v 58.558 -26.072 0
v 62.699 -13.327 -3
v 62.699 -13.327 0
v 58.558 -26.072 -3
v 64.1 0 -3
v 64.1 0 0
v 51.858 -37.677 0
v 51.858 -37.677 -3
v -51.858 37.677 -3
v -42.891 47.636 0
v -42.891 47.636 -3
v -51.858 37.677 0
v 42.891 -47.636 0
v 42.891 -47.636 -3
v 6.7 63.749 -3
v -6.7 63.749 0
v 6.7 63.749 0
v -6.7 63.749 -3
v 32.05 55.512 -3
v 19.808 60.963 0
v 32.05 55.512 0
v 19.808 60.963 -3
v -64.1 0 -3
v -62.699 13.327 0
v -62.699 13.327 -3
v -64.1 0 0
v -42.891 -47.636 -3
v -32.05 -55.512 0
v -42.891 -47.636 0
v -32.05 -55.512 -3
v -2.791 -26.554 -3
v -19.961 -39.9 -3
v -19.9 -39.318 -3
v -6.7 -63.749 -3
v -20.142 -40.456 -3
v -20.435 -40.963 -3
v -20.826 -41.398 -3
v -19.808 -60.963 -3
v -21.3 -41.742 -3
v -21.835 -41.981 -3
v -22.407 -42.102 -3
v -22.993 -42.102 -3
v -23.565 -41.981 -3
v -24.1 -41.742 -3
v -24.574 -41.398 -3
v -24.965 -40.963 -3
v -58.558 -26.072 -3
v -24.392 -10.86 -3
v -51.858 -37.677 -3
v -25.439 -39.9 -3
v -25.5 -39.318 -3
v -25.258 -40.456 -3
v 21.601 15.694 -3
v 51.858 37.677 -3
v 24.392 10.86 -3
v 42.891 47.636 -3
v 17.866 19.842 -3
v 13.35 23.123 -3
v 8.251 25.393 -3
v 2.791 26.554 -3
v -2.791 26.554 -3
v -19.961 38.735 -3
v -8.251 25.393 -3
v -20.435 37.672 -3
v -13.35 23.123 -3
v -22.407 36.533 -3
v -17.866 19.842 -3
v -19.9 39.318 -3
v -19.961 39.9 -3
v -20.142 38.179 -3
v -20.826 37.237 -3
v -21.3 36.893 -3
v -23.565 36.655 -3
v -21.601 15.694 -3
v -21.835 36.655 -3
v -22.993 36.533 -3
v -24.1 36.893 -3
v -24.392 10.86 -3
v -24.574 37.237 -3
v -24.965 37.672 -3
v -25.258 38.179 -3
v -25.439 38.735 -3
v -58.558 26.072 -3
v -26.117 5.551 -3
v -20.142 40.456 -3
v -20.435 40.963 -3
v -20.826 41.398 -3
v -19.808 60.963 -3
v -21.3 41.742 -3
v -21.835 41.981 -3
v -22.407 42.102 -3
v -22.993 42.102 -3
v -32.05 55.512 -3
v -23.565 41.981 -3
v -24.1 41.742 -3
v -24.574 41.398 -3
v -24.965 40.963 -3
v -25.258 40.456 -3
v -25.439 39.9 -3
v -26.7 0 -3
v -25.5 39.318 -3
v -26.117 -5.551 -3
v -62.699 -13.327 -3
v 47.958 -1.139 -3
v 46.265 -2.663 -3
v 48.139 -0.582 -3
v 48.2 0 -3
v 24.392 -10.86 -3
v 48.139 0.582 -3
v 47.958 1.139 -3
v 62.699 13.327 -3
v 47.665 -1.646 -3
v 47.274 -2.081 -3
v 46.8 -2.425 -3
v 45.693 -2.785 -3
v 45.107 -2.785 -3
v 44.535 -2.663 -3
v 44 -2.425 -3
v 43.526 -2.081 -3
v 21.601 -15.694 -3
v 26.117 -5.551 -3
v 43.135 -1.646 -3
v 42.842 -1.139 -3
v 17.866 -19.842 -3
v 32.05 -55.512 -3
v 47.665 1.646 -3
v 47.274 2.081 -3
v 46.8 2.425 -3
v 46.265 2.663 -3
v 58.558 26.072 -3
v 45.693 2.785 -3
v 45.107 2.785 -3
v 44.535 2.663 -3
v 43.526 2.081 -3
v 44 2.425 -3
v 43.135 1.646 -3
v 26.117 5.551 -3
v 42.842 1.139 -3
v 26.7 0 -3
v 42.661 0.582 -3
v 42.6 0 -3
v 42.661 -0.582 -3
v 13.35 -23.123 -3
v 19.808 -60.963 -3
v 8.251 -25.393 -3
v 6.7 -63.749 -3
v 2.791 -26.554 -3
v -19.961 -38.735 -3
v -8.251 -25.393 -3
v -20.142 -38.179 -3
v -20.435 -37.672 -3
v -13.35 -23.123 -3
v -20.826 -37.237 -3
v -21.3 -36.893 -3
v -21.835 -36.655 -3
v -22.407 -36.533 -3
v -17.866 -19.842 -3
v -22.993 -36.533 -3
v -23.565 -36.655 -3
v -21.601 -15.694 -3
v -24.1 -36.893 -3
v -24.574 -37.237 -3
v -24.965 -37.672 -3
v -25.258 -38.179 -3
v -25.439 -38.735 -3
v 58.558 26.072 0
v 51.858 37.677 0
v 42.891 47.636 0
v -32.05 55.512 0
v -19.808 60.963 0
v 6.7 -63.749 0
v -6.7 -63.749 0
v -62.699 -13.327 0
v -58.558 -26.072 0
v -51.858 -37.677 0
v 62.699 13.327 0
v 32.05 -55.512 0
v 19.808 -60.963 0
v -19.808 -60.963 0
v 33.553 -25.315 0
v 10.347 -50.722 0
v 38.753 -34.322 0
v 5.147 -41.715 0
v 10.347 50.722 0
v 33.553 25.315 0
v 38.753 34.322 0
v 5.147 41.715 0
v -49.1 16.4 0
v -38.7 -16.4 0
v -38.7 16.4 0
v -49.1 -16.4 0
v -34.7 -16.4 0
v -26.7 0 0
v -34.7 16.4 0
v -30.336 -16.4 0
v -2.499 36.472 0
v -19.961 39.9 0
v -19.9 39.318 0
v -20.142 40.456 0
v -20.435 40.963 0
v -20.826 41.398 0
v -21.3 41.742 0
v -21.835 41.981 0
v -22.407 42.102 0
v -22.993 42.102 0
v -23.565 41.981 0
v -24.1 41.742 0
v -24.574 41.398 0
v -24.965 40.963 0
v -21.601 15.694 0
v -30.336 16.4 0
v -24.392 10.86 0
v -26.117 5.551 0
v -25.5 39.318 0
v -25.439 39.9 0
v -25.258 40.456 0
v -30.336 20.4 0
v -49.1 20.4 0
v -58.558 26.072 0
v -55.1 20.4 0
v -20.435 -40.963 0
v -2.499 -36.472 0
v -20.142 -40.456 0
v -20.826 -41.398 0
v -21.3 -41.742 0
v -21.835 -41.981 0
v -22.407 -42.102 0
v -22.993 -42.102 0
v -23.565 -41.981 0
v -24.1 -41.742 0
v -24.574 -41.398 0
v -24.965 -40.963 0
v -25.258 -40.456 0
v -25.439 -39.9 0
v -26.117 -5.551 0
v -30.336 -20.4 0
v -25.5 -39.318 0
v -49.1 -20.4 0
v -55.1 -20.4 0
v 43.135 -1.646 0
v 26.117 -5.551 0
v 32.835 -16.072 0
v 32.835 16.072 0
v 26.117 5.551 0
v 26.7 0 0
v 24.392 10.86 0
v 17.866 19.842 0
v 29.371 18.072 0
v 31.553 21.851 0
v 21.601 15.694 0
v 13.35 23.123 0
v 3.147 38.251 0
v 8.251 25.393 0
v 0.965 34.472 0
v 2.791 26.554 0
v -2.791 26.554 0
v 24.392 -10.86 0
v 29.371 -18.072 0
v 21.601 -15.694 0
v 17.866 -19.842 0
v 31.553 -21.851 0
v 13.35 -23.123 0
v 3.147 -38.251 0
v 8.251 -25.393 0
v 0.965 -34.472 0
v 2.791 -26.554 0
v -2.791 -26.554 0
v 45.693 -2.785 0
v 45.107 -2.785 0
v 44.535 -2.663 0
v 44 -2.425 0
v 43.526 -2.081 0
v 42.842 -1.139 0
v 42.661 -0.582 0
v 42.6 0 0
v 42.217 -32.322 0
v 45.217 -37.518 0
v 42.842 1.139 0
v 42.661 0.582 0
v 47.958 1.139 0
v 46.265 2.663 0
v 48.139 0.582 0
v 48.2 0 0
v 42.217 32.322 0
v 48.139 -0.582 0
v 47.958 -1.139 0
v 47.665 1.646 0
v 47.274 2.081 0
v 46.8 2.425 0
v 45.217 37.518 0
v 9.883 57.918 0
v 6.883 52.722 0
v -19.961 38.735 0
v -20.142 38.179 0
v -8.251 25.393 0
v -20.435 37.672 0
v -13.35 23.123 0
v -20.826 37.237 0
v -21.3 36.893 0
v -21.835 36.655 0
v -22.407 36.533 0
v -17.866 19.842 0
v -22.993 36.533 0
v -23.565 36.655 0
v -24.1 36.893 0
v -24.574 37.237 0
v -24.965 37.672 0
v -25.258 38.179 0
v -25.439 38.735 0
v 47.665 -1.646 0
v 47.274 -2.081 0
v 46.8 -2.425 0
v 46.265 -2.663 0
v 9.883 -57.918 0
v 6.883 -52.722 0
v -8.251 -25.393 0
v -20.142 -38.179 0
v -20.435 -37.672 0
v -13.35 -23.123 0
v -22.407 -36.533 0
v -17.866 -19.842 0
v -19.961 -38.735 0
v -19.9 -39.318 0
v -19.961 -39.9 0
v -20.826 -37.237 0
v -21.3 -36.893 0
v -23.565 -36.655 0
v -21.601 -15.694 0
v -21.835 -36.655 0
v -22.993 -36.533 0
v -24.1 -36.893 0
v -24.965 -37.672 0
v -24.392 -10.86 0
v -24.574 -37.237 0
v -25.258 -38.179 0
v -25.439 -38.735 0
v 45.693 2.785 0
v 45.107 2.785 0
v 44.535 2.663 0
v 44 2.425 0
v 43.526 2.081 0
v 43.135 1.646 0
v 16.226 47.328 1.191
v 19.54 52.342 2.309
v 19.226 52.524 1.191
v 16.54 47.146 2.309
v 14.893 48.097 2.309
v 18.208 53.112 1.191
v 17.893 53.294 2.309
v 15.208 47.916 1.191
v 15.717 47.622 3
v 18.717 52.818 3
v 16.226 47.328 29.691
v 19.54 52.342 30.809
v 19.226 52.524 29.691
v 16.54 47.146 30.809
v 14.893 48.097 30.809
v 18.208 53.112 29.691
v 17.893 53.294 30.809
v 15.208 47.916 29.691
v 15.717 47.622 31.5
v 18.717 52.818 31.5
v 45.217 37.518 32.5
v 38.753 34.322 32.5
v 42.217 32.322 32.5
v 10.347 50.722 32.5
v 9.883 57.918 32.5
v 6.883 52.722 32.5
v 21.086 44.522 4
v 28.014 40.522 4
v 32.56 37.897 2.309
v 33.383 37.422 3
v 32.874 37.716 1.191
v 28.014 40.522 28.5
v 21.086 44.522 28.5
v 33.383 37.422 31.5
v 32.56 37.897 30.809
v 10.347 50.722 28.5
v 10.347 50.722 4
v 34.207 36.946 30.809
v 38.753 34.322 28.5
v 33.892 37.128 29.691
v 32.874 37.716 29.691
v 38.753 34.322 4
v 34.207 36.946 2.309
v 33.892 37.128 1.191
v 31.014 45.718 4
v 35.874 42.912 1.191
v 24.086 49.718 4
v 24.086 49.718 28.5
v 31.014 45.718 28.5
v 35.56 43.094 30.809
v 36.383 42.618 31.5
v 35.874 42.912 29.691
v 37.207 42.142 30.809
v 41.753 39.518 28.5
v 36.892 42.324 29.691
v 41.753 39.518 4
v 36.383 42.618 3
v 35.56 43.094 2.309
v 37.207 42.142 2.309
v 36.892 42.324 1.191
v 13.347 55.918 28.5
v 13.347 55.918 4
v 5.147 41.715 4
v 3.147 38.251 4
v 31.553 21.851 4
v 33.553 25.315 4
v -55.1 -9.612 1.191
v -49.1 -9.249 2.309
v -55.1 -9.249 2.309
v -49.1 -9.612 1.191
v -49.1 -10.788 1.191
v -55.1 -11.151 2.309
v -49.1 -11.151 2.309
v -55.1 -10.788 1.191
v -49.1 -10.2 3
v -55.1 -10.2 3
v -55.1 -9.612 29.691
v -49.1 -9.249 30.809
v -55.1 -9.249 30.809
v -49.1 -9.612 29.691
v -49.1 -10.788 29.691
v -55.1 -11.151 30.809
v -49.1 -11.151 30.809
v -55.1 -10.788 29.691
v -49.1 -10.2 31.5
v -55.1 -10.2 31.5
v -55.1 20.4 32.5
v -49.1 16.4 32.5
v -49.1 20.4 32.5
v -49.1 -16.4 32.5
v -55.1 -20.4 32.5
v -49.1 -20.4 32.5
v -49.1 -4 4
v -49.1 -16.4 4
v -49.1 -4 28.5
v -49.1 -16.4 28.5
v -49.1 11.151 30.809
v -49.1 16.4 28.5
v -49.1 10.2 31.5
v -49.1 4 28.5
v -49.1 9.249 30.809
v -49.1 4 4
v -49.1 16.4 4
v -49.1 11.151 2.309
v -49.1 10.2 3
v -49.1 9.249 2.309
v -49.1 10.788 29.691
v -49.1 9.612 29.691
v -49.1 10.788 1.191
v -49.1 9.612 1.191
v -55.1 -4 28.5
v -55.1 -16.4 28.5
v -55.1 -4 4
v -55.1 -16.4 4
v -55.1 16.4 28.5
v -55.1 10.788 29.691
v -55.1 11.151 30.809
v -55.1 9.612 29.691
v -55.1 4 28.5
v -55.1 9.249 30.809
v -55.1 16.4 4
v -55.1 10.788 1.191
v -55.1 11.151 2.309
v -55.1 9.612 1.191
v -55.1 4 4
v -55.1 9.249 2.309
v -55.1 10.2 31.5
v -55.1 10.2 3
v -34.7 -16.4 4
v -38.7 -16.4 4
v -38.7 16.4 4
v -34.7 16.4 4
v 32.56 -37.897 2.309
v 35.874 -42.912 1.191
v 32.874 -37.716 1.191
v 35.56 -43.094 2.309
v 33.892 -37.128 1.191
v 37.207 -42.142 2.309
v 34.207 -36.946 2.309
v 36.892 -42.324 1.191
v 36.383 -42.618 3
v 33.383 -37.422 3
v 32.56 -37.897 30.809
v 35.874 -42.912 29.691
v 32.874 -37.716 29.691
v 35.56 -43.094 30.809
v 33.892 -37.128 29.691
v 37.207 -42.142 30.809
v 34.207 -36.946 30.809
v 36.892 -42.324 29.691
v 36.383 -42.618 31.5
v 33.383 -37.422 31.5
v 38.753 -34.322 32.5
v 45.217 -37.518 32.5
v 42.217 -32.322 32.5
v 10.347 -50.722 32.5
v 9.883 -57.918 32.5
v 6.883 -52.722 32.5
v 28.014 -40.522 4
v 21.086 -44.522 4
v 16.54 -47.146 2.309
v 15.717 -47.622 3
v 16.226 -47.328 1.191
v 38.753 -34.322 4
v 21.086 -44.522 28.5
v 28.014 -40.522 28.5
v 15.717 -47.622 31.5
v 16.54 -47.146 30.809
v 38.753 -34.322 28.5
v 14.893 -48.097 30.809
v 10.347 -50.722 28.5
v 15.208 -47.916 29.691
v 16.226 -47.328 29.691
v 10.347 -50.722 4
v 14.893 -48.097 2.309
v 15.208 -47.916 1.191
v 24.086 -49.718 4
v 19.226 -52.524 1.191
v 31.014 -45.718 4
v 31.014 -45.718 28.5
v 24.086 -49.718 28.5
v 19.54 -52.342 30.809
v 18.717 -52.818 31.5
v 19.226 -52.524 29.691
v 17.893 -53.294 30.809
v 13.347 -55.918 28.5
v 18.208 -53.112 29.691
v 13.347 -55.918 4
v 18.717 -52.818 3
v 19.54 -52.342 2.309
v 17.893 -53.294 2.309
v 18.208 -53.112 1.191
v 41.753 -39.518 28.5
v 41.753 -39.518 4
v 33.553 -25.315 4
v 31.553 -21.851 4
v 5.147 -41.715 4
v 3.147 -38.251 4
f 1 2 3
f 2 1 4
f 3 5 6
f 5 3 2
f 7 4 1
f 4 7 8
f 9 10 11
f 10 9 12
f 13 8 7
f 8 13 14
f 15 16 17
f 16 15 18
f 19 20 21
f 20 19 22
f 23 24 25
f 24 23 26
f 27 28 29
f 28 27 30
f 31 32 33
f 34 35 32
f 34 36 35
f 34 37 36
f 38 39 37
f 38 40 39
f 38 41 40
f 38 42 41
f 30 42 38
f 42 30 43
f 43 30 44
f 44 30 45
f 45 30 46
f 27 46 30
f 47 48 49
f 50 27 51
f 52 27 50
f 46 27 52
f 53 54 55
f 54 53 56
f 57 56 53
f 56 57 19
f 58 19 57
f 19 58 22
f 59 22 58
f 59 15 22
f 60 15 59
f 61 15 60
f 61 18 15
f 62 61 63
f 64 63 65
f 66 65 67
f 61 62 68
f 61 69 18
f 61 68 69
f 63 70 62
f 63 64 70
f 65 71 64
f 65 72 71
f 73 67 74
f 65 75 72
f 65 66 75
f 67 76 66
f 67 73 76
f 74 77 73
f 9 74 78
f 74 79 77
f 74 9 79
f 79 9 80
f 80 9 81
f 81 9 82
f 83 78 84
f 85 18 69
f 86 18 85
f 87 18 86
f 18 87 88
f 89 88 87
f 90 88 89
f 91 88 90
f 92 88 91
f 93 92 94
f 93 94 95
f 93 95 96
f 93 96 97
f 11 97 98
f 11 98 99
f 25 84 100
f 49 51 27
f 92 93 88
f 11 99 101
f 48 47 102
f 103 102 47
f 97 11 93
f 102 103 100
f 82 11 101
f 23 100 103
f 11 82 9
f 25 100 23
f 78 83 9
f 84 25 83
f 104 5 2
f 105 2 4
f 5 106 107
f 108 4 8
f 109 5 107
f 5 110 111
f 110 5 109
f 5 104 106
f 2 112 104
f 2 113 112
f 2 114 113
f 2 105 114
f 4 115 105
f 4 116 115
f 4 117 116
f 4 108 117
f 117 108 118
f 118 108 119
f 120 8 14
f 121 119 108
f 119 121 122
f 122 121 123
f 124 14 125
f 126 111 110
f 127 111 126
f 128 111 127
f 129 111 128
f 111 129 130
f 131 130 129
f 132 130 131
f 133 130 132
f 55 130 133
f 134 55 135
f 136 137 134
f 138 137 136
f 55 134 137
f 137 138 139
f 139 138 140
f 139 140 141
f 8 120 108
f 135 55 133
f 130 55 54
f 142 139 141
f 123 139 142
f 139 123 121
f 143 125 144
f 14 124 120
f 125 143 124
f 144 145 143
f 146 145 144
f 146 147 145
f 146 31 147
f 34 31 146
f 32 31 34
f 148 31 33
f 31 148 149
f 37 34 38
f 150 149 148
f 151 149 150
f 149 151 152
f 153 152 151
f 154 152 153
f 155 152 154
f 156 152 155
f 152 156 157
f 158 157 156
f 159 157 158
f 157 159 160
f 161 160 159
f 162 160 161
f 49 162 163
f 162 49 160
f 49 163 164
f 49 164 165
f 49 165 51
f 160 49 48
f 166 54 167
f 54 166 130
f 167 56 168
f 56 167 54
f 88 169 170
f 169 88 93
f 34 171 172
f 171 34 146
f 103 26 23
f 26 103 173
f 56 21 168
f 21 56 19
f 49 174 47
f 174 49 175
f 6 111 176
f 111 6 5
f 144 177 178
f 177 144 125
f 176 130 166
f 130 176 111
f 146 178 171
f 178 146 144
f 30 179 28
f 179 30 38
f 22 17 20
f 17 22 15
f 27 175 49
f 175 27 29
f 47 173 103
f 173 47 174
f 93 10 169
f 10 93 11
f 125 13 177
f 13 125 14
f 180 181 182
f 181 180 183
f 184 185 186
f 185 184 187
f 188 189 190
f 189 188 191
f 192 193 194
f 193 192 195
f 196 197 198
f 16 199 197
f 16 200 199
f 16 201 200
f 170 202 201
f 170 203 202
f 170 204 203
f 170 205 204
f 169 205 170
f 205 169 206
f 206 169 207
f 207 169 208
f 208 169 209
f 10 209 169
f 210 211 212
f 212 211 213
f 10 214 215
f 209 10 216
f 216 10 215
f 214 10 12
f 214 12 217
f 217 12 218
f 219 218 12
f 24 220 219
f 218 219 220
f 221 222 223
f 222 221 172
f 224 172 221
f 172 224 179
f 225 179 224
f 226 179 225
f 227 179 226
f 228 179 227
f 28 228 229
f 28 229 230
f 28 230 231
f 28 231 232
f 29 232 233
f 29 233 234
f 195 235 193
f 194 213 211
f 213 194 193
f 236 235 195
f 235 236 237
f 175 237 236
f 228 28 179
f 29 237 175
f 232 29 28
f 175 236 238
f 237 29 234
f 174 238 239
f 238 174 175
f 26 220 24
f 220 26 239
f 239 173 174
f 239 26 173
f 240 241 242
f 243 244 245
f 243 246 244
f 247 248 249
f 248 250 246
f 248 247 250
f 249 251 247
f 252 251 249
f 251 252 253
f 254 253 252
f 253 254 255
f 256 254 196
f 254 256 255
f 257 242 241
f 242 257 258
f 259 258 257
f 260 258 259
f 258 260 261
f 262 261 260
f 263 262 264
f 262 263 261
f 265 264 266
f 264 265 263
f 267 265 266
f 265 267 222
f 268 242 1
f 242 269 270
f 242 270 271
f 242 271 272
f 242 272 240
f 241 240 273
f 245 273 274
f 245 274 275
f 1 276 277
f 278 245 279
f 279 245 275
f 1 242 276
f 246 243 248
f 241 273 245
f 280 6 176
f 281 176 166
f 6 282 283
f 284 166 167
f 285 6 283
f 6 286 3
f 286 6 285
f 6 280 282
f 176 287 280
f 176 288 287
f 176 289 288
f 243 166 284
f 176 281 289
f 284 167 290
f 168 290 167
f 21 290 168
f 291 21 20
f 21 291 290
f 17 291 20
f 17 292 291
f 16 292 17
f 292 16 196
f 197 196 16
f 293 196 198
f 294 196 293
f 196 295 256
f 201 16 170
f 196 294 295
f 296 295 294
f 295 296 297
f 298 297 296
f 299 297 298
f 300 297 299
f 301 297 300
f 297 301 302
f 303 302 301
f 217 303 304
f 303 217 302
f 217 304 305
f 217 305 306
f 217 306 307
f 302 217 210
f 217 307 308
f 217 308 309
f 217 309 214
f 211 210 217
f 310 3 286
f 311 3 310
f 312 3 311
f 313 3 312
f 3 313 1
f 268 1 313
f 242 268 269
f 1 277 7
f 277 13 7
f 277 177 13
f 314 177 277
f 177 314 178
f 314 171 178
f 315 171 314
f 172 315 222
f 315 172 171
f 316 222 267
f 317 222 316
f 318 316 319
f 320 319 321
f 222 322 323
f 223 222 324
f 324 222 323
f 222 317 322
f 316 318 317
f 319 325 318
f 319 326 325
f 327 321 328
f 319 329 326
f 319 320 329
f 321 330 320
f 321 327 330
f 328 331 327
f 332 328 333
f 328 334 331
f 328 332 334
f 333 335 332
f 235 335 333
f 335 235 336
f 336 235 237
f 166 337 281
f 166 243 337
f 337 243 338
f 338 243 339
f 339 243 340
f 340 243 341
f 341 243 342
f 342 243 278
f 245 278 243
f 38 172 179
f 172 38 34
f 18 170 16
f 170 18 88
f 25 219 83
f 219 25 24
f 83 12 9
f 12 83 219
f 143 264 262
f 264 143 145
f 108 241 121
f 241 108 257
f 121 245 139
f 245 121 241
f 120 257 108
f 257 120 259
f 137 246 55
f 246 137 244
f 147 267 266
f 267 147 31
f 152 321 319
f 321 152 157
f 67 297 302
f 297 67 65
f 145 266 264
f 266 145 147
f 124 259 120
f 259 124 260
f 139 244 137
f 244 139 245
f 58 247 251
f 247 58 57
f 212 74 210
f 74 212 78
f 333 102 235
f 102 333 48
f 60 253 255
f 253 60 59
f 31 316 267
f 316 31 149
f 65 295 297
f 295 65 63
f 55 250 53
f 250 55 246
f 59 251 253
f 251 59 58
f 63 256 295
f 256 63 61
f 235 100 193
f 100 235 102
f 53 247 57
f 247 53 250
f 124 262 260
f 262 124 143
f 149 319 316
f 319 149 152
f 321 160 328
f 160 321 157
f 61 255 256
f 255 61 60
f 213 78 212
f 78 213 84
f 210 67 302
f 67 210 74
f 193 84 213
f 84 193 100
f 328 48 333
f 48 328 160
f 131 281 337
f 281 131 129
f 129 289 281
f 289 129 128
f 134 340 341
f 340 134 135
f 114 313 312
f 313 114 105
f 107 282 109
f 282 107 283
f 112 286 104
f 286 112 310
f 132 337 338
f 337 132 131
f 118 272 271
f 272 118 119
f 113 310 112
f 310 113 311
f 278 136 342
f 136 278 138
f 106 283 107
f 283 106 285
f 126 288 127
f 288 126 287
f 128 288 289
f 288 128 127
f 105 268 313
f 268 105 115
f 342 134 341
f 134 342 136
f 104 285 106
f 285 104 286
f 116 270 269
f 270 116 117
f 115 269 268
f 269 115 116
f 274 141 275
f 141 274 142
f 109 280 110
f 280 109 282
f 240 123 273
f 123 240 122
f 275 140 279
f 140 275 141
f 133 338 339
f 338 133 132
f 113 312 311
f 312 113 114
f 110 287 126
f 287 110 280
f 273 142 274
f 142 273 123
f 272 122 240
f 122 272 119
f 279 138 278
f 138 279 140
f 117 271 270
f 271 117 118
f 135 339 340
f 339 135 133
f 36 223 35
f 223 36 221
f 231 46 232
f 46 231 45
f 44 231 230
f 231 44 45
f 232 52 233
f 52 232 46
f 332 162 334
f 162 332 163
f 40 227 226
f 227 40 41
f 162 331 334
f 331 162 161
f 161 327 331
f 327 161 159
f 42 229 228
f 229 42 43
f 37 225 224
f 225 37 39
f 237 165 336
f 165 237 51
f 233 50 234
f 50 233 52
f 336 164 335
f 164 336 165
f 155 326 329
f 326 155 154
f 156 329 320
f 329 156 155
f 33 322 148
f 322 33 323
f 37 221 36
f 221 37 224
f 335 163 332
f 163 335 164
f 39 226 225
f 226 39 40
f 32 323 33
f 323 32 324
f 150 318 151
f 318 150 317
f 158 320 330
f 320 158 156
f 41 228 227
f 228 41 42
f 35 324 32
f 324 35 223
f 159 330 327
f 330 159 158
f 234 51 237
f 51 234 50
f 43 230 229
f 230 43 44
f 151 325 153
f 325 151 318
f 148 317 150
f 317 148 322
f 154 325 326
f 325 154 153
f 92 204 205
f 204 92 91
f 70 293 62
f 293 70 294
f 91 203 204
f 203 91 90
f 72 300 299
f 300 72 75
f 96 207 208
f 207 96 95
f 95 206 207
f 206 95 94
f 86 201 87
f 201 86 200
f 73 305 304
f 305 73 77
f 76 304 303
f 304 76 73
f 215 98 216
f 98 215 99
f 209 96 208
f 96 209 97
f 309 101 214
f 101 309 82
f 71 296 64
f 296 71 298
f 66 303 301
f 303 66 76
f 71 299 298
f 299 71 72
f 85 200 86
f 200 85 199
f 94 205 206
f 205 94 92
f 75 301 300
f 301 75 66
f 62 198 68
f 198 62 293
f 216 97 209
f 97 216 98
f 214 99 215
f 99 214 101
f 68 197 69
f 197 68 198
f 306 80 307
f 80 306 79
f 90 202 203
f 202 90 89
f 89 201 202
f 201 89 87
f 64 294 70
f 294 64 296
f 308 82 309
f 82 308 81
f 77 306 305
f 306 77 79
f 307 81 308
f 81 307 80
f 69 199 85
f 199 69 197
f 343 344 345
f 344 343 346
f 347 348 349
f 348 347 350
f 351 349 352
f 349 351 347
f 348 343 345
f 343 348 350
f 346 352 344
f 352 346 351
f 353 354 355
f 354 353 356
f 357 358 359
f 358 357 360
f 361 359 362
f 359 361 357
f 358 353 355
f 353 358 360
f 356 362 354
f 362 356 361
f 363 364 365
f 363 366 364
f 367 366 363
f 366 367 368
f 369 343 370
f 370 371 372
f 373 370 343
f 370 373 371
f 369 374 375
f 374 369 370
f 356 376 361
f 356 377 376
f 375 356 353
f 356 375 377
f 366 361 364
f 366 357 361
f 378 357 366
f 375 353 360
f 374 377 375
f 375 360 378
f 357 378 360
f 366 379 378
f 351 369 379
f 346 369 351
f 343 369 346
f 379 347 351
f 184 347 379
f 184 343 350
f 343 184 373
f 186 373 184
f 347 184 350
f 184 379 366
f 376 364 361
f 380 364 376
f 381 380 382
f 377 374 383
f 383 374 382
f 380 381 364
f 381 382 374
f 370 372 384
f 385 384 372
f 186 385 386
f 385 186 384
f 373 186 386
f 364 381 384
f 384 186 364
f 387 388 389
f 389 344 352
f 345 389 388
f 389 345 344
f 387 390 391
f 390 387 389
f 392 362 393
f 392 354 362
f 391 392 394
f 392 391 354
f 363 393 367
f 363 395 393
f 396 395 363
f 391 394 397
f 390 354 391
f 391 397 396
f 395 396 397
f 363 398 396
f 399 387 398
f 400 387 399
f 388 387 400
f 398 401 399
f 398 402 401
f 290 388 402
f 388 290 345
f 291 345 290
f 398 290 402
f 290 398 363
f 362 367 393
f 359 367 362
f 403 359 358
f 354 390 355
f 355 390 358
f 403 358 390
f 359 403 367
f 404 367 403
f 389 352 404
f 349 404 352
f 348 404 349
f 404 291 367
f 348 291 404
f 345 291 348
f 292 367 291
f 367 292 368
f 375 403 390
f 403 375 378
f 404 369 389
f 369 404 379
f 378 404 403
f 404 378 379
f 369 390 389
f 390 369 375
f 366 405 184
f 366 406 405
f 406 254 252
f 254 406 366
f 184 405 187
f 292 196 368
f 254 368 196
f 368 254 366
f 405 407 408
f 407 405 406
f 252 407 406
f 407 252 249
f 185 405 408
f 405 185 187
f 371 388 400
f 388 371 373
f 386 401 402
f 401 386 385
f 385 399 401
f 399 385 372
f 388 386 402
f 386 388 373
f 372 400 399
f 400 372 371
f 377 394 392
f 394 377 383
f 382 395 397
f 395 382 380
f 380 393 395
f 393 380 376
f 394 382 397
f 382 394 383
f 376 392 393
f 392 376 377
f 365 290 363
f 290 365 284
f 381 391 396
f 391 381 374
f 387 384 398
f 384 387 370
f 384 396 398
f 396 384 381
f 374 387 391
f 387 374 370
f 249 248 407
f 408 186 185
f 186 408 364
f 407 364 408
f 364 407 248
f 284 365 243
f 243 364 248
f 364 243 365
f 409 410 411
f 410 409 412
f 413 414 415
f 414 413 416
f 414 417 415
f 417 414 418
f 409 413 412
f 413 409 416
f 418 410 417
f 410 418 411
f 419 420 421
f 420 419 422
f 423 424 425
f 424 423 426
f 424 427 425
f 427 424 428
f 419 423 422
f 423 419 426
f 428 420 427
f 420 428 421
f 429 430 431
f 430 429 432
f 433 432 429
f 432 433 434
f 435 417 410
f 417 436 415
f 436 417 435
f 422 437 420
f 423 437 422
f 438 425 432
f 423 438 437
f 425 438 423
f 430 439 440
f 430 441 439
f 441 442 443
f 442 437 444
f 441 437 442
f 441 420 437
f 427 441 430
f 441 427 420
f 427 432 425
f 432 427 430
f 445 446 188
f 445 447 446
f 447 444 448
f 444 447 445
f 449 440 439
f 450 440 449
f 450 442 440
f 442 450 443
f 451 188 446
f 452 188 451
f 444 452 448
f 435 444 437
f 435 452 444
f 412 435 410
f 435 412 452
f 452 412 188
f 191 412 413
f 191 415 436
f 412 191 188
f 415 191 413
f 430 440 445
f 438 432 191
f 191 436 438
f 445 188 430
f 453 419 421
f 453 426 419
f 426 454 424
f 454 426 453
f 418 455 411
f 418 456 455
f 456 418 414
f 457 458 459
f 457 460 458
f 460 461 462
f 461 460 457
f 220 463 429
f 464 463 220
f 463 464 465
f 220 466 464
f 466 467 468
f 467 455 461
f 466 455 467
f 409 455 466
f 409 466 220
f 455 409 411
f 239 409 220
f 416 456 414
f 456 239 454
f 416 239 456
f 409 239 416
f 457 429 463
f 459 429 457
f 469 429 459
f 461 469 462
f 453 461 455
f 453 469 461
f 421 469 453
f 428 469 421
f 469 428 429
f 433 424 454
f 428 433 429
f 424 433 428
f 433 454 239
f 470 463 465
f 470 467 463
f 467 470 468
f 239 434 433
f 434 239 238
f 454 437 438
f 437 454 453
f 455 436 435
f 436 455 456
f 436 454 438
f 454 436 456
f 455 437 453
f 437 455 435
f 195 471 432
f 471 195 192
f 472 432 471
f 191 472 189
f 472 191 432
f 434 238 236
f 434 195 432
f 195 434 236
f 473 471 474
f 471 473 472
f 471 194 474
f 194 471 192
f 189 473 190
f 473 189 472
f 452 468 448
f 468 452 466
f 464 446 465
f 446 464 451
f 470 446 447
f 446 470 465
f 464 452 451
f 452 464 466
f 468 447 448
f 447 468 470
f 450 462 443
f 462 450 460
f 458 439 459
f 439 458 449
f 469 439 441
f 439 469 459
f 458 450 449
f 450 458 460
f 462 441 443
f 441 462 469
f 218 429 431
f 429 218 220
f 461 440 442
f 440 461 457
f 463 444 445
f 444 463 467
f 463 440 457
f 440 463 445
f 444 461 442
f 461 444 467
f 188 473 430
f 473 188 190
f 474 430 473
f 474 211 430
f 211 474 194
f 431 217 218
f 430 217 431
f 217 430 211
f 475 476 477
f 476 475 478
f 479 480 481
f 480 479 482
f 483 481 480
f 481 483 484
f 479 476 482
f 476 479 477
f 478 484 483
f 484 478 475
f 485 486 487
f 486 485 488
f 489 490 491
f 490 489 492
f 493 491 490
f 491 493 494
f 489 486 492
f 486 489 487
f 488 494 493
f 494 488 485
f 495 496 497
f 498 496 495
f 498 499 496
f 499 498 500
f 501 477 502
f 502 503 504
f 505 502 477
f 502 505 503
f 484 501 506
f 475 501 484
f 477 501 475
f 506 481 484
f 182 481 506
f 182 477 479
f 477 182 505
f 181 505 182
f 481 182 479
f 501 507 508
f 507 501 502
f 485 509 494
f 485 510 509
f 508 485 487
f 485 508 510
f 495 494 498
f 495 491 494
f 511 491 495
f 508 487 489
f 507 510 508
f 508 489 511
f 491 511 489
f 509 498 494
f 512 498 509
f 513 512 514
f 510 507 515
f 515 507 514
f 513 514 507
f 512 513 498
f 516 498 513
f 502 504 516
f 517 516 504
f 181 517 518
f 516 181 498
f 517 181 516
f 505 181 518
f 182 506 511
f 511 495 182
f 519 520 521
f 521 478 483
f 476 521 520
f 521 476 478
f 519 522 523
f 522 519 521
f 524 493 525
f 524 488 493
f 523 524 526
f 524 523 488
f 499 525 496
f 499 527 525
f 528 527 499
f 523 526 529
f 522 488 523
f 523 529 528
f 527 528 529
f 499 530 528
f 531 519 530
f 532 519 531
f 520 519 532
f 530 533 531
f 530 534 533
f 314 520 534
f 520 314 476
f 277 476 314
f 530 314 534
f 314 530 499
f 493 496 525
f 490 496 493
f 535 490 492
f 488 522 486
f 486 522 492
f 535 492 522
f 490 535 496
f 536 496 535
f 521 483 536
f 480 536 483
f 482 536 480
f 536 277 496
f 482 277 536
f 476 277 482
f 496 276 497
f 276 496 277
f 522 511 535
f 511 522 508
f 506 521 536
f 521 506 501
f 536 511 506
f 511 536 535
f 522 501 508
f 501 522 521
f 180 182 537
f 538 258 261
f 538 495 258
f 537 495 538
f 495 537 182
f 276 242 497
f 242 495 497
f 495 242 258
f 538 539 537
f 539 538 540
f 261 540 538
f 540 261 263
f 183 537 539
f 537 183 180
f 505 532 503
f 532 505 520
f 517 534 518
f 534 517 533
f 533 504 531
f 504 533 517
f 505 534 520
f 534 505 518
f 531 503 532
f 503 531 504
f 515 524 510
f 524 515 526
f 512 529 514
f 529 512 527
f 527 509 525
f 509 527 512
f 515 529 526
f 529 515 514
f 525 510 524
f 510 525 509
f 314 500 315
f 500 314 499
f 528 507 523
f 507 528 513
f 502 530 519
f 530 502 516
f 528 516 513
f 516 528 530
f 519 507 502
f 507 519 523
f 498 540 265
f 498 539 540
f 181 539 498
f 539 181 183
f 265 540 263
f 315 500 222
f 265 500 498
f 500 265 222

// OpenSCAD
// file: servo_holder.scad
s_l = 24.5;
s_w = 12.4;
wall = 4;
depth = 6;
sc_l = s_l + 2*wall;
sc_w = s_w + 2*wall;
off = 0.1;

module servo_compontent(holes) {
	difference(){
		cube([sc_l,sc_w,depth]);
		translate([wall, wall, -off]){
			cube([s_l, s_w, depth + 2*off]);
		}
		if(holes){
			translate([0.5*wall, wall+0.5*s_w, -off]){
				cylinder(r=1, h=depth+2*off);
			}
			translate([1.5*wall+s_l, wall+0.5*s_w, -off]){
				cylinder(r=1, h=depth+2*off);
			}
		}
	}
}

module servo_holder() {
	servo_compontent(true);
	translate([0,0,sc_w-wall]){
		cube([wall,sc_w,wall]);
	}
	translate([sc_l,sc_w,depth]){
			rotate(180,[0,0,1]){
				difference(){
				cube([sc_l,wall, sc_w]);
				translate([0,-off,0]){
					rotate(-30, [0,1,0]){
						cube([sc_l*2,wall+2*off,sc_l]);
					}
				}
			}
		}
	}
}
// main file
include <servo_holder.scad>;

a_width = 53.4;
a_length = 68.6;
s_depth = 15.8;
slop = 5;
offset = 0.1;
thickness = 3;

s_l = 24.5;
s_w = 12.4;
wall = 4;
depth = 6;
sc_l = s_l + 2*wall;
sc_w = s_w + 2*wall;
off = 0.1;

male_height = thickness + 2*offset;
male_radius = 2.8;

servo_distance = 0.5*a_length + slop + s_depth;
p_radius = servo_distance + slop + wall;
h_radius = 0.5*a_width;
male_distance = p_radius - 0.5*(p_radius - h_radius);

module male() {
	translate([male_distance, 0,-offset]){
	cylinder(r=male_radius, h=male_height, $fs=0.3);
	}
}

module two_servos() {
	translate([servo_distance,0,0]){
		mirror([0,1,0]){
			rotate(-90, [0,1,0]){
				servo_holder();
			}
		}
		rotate(-90, [0,1,0]){
			servo_holder();
		}
	}
}



rotate(180, [1,0,0]){
	difference(){
		cylinder(r=p_radius, h=thickness, $fs=0.5);
		translate([0,0,-offset]){
			cylinder(r=h_radius, h=thickness + 2*offset, $fs=0.5);
		}
		male();
		rotate(120, [0,0,1]){male();}
		rotate(240, [0,0,1]){male();}
	}
}
rotate(60, [0,0,1]){
	two_servos();
	rotate(120, [0,0,1]){two_servos();}
	rotate(240, [0,0,1]){two_servos();}
}
